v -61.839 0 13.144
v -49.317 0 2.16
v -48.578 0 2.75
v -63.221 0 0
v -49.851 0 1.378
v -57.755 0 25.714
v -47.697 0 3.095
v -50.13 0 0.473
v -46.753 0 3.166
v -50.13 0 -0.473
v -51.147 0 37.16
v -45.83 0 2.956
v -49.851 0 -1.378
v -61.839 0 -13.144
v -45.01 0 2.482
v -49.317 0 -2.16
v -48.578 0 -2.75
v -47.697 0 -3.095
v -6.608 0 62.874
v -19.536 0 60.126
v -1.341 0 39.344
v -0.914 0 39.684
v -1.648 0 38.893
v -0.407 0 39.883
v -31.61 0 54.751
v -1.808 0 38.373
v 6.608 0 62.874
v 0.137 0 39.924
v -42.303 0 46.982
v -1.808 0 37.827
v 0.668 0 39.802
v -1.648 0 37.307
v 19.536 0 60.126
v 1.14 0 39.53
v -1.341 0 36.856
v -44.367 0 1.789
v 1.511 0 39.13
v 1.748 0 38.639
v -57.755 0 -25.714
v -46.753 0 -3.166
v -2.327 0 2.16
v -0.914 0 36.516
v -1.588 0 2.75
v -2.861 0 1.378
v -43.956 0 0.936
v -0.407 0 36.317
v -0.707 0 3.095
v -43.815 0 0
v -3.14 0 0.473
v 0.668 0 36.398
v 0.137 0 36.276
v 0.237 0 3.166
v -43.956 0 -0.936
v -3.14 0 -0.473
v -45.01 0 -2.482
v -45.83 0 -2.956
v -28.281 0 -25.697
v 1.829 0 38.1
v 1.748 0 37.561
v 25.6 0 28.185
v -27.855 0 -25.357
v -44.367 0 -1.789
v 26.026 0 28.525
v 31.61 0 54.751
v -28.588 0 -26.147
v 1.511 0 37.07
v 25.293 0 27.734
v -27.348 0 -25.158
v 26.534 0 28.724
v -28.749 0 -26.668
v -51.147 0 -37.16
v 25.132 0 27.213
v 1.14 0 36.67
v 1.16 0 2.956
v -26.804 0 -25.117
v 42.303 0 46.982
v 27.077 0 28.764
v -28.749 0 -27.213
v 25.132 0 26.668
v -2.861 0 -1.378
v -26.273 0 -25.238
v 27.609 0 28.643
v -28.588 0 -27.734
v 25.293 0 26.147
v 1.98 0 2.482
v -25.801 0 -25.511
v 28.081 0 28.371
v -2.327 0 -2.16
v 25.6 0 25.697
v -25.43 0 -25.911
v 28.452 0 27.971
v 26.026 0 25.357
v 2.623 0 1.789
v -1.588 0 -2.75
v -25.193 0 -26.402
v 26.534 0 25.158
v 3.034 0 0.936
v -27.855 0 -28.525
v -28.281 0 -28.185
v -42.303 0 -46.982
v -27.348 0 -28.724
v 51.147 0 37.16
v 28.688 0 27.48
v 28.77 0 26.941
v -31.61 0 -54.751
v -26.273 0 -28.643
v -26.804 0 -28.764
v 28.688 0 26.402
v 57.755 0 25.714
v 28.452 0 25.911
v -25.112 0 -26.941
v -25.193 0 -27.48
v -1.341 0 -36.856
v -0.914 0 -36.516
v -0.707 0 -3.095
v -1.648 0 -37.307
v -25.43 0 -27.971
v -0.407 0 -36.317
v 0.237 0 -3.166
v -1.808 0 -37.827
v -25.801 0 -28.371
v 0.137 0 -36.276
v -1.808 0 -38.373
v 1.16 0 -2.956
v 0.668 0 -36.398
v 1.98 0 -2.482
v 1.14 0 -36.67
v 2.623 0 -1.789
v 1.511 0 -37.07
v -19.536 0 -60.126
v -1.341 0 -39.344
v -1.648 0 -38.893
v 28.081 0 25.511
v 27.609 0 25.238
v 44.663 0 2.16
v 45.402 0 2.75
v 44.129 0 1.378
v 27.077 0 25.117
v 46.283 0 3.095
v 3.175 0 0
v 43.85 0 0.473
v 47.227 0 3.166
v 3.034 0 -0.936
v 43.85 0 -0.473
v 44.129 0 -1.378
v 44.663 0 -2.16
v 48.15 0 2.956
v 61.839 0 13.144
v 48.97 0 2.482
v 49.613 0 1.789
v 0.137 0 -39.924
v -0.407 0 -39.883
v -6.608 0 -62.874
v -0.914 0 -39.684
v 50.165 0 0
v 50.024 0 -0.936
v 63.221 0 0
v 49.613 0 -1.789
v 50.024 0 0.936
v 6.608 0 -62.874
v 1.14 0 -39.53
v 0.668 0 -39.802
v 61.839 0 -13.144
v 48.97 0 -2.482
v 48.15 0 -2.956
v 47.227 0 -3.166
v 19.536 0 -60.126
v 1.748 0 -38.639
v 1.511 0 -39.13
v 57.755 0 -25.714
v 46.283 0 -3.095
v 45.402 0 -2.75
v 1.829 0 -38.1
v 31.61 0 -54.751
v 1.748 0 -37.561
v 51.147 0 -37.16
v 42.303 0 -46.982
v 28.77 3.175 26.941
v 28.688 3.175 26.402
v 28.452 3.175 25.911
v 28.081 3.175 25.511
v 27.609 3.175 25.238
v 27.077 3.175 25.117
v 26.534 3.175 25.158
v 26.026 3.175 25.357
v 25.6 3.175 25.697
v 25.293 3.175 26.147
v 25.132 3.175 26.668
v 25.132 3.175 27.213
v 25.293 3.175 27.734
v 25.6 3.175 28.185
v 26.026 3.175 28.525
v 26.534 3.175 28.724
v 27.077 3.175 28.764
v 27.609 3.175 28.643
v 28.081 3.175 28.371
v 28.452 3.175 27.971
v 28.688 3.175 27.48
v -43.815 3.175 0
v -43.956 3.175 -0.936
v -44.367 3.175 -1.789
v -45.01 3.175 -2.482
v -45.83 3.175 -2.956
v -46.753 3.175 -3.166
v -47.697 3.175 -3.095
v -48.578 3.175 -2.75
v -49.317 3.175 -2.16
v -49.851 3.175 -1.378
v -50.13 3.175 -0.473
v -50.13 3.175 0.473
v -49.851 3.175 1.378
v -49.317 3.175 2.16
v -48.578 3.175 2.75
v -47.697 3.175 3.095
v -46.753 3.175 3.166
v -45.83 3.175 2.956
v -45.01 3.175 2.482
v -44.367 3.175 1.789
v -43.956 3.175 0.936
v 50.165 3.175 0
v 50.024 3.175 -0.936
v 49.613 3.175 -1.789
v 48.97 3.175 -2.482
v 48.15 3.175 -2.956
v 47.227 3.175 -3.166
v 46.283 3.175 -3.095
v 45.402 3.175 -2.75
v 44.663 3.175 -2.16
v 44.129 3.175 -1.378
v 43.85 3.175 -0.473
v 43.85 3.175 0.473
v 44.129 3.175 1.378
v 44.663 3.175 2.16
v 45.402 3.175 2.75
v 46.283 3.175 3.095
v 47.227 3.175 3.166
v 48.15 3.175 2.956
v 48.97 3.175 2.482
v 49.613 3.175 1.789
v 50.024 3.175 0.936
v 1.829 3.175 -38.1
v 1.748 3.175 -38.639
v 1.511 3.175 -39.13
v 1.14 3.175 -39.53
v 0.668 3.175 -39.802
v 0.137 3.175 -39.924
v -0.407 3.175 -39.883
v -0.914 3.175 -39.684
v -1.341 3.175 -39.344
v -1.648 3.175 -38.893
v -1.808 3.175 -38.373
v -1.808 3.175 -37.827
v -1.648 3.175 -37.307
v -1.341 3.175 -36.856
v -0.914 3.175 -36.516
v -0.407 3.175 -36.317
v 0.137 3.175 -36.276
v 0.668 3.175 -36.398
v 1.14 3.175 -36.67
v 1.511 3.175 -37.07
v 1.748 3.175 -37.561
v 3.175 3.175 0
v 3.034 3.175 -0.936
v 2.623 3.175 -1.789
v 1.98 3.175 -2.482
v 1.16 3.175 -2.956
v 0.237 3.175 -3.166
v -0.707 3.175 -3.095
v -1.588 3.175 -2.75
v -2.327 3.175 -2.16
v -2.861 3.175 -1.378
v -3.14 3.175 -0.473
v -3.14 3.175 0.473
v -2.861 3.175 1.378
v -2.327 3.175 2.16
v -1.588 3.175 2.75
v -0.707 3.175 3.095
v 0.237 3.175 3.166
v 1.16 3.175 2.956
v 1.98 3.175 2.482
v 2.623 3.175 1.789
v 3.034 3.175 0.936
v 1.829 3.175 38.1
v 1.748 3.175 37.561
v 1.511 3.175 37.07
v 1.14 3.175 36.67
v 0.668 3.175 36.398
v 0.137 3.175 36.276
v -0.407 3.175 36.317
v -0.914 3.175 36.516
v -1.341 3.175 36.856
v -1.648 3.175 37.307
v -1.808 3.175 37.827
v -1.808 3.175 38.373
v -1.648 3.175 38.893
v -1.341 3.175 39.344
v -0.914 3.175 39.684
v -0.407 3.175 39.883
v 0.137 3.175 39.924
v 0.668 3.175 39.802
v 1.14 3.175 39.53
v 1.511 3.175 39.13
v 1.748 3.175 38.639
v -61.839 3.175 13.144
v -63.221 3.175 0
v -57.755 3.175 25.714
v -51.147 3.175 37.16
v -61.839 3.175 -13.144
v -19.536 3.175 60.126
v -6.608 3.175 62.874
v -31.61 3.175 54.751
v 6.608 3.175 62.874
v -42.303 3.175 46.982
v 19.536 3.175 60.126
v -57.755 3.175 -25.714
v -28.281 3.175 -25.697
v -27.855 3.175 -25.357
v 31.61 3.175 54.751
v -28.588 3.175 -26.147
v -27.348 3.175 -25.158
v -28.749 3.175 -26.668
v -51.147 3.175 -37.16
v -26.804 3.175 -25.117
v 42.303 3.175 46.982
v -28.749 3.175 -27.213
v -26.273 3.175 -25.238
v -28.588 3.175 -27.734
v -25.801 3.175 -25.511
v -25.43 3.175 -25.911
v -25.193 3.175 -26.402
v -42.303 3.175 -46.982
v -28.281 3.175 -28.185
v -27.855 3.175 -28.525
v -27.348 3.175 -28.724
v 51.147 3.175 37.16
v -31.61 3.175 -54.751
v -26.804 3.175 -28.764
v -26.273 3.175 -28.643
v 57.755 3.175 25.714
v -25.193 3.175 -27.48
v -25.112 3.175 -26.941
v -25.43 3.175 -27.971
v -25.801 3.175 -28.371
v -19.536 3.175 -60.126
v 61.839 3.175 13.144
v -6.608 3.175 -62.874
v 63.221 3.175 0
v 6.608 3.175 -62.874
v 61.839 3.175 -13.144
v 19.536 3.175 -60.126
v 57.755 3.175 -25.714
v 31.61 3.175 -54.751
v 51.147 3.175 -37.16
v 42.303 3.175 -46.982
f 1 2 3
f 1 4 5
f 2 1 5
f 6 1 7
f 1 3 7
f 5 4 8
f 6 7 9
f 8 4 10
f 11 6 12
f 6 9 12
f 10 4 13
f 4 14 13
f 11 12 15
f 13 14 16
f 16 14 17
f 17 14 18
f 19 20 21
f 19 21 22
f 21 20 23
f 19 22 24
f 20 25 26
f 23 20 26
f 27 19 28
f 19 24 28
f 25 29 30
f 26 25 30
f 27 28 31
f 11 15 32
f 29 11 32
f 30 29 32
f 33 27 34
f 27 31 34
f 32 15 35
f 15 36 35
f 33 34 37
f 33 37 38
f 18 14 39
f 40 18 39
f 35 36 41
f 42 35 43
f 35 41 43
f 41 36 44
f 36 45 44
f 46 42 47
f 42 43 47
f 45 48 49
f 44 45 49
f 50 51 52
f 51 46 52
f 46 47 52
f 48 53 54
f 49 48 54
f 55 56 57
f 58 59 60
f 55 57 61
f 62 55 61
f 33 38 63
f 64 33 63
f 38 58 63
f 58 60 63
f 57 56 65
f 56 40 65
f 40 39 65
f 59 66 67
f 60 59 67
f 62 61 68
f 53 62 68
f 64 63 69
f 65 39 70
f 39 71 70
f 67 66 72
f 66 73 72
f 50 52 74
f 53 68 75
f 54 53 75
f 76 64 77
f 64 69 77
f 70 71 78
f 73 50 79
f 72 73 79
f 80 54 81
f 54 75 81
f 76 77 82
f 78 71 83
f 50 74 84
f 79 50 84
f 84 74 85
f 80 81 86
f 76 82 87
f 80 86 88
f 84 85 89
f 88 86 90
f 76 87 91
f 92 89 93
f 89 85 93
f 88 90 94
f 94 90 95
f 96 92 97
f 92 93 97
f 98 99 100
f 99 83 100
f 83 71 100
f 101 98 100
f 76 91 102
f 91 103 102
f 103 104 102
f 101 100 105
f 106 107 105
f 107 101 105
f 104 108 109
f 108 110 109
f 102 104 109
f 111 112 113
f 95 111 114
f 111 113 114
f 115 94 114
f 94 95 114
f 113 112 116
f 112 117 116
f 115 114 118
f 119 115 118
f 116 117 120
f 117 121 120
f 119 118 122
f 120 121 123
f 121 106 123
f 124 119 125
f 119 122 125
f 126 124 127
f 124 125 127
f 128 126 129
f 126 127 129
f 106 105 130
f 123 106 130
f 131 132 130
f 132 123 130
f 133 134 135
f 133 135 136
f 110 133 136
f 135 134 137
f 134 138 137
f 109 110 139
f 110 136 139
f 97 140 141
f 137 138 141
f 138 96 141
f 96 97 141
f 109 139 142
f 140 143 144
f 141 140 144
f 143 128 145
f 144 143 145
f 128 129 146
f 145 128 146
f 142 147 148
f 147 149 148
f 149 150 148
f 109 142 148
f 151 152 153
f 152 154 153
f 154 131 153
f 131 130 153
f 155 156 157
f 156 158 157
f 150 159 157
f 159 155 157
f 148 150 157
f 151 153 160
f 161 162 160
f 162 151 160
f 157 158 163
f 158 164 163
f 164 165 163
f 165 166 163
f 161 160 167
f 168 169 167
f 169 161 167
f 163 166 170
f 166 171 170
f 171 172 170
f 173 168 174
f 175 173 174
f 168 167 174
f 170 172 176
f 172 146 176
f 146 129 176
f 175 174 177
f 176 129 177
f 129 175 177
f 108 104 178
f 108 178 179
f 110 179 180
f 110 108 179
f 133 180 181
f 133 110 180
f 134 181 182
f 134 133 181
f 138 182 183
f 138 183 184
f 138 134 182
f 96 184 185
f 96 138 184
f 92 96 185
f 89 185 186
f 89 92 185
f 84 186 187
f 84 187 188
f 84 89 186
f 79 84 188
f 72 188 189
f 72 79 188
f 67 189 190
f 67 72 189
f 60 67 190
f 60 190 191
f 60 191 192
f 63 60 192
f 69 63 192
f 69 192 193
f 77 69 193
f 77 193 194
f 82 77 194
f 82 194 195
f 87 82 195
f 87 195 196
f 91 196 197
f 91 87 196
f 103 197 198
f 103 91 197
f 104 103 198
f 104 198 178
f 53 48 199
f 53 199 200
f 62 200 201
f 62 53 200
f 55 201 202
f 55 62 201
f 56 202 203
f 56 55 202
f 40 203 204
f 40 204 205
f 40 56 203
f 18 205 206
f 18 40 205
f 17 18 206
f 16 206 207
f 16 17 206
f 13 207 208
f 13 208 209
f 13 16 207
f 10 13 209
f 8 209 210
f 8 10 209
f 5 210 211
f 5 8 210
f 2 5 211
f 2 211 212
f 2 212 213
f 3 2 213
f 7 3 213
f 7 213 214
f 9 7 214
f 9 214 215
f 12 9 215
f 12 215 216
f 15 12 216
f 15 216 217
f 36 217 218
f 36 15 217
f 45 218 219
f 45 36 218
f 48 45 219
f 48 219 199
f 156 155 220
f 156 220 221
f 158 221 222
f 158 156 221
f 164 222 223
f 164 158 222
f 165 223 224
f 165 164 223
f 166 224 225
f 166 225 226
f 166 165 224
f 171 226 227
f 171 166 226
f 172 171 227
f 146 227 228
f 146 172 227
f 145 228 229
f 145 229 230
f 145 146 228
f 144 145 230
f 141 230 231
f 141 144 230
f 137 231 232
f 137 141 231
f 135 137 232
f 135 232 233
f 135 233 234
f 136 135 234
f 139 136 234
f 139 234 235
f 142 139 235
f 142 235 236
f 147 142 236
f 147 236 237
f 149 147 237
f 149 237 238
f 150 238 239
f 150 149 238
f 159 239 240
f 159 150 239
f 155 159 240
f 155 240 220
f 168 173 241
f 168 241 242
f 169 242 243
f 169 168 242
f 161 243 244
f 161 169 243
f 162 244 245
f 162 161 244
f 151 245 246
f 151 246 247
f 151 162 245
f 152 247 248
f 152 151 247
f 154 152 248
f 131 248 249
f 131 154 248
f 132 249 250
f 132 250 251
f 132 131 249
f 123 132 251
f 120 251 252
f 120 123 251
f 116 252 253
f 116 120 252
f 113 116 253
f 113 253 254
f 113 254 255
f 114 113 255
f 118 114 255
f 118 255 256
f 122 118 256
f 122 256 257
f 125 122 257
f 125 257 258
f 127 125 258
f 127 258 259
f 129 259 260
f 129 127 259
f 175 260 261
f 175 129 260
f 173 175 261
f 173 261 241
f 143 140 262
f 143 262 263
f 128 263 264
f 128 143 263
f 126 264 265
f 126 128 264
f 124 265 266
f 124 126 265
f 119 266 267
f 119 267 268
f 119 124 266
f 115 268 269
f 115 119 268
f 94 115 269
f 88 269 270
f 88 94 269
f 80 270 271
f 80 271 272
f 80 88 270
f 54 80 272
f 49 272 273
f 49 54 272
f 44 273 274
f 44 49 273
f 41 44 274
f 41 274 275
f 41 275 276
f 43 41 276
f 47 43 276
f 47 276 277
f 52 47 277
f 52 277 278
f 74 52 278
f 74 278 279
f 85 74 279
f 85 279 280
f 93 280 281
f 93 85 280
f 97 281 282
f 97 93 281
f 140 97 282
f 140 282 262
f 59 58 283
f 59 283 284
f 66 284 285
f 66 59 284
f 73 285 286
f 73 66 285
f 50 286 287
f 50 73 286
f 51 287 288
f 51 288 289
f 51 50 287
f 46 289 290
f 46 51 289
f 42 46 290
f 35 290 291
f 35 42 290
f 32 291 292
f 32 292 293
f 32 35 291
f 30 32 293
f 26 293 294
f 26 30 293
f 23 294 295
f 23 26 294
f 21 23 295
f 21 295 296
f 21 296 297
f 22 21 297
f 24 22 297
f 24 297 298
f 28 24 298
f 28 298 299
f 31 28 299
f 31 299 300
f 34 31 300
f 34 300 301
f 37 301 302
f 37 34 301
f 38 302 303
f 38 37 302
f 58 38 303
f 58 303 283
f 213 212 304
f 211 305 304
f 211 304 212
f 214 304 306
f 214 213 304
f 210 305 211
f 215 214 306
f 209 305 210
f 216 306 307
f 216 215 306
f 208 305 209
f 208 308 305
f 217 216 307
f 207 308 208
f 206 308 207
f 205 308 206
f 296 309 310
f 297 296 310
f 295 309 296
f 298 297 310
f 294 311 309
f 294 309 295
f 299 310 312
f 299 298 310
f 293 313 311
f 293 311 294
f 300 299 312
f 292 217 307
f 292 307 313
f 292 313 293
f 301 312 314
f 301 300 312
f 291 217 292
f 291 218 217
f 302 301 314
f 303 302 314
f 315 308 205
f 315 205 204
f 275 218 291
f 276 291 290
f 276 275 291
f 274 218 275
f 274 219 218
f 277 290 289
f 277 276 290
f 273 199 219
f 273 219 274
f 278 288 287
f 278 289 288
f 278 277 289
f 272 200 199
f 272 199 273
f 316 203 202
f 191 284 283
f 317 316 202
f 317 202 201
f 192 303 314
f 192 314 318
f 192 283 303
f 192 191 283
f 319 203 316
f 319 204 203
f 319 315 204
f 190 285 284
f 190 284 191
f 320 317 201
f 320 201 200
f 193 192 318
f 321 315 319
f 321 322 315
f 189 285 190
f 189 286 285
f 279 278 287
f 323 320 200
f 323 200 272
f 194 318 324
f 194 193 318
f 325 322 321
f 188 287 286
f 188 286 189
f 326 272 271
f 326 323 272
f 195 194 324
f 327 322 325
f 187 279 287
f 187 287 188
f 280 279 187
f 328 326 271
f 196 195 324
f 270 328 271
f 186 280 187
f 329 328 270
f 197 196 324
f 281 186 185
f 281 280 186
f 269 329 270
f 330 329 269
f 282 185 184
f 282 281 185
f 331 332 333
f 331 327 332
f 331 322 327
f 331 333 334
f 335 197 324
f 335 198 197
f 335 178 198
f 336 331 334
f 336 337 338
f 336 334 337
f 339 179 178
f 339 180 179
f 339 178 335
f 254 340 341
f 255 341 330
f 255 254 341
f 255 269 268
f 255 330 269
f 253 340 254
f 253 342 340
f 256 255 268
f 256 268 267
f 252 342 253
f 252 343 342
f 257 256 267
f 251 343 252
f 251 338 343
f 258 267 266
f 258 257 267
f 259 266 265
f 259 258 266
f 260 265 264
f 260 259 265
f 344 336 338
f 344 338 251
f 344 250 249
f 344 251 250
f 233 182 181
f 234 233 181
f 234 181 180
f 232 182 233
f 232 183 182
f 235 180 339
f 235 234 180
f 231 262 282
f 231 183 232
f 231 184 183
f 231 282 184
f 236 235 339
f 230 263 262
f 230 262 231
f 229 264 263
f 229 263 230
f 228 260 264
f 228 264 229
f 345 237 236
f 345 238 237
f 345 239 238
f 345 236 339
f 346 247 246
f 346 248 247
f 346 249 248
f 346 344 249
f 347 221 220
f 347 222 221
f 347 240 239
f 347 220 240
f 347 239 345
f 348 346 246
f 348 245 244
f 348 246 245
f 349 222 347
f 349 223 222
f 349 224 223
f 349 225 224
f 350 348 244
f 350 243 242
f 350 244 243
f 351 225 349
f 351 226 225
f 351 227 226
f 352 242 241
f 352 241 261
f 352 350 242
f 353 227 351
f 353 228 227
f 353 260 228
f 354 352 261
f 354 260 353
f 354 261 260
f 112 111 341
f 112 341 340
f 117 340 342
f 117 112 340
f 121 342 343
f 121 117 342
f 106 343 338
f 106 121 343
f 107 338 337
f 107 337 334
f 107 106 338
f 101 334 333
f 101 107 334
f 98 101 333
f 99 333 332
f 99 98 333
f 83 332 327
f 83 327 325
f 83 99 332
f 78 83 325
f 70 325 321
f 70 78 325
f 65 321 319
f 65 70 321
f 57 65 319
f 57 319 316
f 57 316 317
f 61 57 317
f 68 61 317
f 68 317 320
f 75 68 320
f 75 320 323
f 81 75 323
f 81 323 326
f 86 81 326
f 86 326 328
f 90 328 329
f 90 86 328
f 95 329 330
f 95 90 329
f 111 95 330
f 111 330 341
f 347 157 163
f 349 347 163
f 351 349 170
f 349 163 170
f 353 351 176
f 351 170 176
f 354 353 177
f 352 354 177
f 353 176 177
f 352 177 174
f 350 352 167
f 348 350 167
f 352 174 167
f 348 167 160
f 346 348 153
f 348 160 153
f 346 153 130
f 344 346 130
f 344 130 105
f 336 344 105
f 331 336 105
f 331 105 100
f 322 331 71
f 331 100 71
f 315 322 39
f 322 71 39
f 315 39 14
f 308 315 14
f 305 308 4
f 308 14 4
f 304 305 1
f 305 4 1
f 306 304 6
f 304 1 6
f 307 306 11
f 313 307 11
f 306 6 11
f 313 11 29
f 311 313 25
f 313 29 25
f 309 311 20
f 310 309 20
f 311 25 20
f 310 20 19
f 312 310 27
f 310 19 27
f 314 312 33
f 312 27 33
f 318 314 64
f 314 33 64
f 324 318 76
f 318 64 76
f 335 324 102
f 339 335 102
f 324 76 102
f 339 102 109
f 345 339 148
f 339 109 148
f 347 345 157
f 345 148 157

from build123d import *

# Parameters (mm, degrees)
SKETCH2_R           = 63.2206
SKETCH2_R_2         = 3.175
SKETCH2_R_3         = 1.8288
BOSS_EXTRUDE1_DEPTH = 3.175


with BuildPart() as part:
    # Sketch2 → Boss-Extrude1 (new body)
    with BuildSketch(Plane(origin=(0, 0, 0), x_dir=(1, 0, 0), z_dir=(0, 1, 0))):
        Circle(SKETCH2_R)
        with Locations((-46.99, 0)):
            Circle(SKETCH2_R_2, mode=Mode.SUBTRACT)
        with Locations((46.99, 0)):
            Circle(SKETCH2_R_2, mode=Mode.SUBTRACT)
        Circle(SKETCH2_R_2, mode=Mode.SUBTRACT)
        with Locations((0, 38.1)):
            Circle(SKETCH2_R_3, mode=Mode.SUBTRACT)
        with Locations((0, -38.1)):
            Circle(SKETCH2_R_3, mode=Mode.SUBTRACT)
        with Locations((-26.940768363, 26.940768363)):
            Circle(SKETCH2_R_3, mode=Mode.SUBTRACT)
        with Locations((26.940768363, -26.940768363)):
            Circle(SKETCH2_R_3, mode=Mode.SUBTRACT)
    extrude(amount=BOSS_EXTRUDE1_DEPTH)


solid = part.part
